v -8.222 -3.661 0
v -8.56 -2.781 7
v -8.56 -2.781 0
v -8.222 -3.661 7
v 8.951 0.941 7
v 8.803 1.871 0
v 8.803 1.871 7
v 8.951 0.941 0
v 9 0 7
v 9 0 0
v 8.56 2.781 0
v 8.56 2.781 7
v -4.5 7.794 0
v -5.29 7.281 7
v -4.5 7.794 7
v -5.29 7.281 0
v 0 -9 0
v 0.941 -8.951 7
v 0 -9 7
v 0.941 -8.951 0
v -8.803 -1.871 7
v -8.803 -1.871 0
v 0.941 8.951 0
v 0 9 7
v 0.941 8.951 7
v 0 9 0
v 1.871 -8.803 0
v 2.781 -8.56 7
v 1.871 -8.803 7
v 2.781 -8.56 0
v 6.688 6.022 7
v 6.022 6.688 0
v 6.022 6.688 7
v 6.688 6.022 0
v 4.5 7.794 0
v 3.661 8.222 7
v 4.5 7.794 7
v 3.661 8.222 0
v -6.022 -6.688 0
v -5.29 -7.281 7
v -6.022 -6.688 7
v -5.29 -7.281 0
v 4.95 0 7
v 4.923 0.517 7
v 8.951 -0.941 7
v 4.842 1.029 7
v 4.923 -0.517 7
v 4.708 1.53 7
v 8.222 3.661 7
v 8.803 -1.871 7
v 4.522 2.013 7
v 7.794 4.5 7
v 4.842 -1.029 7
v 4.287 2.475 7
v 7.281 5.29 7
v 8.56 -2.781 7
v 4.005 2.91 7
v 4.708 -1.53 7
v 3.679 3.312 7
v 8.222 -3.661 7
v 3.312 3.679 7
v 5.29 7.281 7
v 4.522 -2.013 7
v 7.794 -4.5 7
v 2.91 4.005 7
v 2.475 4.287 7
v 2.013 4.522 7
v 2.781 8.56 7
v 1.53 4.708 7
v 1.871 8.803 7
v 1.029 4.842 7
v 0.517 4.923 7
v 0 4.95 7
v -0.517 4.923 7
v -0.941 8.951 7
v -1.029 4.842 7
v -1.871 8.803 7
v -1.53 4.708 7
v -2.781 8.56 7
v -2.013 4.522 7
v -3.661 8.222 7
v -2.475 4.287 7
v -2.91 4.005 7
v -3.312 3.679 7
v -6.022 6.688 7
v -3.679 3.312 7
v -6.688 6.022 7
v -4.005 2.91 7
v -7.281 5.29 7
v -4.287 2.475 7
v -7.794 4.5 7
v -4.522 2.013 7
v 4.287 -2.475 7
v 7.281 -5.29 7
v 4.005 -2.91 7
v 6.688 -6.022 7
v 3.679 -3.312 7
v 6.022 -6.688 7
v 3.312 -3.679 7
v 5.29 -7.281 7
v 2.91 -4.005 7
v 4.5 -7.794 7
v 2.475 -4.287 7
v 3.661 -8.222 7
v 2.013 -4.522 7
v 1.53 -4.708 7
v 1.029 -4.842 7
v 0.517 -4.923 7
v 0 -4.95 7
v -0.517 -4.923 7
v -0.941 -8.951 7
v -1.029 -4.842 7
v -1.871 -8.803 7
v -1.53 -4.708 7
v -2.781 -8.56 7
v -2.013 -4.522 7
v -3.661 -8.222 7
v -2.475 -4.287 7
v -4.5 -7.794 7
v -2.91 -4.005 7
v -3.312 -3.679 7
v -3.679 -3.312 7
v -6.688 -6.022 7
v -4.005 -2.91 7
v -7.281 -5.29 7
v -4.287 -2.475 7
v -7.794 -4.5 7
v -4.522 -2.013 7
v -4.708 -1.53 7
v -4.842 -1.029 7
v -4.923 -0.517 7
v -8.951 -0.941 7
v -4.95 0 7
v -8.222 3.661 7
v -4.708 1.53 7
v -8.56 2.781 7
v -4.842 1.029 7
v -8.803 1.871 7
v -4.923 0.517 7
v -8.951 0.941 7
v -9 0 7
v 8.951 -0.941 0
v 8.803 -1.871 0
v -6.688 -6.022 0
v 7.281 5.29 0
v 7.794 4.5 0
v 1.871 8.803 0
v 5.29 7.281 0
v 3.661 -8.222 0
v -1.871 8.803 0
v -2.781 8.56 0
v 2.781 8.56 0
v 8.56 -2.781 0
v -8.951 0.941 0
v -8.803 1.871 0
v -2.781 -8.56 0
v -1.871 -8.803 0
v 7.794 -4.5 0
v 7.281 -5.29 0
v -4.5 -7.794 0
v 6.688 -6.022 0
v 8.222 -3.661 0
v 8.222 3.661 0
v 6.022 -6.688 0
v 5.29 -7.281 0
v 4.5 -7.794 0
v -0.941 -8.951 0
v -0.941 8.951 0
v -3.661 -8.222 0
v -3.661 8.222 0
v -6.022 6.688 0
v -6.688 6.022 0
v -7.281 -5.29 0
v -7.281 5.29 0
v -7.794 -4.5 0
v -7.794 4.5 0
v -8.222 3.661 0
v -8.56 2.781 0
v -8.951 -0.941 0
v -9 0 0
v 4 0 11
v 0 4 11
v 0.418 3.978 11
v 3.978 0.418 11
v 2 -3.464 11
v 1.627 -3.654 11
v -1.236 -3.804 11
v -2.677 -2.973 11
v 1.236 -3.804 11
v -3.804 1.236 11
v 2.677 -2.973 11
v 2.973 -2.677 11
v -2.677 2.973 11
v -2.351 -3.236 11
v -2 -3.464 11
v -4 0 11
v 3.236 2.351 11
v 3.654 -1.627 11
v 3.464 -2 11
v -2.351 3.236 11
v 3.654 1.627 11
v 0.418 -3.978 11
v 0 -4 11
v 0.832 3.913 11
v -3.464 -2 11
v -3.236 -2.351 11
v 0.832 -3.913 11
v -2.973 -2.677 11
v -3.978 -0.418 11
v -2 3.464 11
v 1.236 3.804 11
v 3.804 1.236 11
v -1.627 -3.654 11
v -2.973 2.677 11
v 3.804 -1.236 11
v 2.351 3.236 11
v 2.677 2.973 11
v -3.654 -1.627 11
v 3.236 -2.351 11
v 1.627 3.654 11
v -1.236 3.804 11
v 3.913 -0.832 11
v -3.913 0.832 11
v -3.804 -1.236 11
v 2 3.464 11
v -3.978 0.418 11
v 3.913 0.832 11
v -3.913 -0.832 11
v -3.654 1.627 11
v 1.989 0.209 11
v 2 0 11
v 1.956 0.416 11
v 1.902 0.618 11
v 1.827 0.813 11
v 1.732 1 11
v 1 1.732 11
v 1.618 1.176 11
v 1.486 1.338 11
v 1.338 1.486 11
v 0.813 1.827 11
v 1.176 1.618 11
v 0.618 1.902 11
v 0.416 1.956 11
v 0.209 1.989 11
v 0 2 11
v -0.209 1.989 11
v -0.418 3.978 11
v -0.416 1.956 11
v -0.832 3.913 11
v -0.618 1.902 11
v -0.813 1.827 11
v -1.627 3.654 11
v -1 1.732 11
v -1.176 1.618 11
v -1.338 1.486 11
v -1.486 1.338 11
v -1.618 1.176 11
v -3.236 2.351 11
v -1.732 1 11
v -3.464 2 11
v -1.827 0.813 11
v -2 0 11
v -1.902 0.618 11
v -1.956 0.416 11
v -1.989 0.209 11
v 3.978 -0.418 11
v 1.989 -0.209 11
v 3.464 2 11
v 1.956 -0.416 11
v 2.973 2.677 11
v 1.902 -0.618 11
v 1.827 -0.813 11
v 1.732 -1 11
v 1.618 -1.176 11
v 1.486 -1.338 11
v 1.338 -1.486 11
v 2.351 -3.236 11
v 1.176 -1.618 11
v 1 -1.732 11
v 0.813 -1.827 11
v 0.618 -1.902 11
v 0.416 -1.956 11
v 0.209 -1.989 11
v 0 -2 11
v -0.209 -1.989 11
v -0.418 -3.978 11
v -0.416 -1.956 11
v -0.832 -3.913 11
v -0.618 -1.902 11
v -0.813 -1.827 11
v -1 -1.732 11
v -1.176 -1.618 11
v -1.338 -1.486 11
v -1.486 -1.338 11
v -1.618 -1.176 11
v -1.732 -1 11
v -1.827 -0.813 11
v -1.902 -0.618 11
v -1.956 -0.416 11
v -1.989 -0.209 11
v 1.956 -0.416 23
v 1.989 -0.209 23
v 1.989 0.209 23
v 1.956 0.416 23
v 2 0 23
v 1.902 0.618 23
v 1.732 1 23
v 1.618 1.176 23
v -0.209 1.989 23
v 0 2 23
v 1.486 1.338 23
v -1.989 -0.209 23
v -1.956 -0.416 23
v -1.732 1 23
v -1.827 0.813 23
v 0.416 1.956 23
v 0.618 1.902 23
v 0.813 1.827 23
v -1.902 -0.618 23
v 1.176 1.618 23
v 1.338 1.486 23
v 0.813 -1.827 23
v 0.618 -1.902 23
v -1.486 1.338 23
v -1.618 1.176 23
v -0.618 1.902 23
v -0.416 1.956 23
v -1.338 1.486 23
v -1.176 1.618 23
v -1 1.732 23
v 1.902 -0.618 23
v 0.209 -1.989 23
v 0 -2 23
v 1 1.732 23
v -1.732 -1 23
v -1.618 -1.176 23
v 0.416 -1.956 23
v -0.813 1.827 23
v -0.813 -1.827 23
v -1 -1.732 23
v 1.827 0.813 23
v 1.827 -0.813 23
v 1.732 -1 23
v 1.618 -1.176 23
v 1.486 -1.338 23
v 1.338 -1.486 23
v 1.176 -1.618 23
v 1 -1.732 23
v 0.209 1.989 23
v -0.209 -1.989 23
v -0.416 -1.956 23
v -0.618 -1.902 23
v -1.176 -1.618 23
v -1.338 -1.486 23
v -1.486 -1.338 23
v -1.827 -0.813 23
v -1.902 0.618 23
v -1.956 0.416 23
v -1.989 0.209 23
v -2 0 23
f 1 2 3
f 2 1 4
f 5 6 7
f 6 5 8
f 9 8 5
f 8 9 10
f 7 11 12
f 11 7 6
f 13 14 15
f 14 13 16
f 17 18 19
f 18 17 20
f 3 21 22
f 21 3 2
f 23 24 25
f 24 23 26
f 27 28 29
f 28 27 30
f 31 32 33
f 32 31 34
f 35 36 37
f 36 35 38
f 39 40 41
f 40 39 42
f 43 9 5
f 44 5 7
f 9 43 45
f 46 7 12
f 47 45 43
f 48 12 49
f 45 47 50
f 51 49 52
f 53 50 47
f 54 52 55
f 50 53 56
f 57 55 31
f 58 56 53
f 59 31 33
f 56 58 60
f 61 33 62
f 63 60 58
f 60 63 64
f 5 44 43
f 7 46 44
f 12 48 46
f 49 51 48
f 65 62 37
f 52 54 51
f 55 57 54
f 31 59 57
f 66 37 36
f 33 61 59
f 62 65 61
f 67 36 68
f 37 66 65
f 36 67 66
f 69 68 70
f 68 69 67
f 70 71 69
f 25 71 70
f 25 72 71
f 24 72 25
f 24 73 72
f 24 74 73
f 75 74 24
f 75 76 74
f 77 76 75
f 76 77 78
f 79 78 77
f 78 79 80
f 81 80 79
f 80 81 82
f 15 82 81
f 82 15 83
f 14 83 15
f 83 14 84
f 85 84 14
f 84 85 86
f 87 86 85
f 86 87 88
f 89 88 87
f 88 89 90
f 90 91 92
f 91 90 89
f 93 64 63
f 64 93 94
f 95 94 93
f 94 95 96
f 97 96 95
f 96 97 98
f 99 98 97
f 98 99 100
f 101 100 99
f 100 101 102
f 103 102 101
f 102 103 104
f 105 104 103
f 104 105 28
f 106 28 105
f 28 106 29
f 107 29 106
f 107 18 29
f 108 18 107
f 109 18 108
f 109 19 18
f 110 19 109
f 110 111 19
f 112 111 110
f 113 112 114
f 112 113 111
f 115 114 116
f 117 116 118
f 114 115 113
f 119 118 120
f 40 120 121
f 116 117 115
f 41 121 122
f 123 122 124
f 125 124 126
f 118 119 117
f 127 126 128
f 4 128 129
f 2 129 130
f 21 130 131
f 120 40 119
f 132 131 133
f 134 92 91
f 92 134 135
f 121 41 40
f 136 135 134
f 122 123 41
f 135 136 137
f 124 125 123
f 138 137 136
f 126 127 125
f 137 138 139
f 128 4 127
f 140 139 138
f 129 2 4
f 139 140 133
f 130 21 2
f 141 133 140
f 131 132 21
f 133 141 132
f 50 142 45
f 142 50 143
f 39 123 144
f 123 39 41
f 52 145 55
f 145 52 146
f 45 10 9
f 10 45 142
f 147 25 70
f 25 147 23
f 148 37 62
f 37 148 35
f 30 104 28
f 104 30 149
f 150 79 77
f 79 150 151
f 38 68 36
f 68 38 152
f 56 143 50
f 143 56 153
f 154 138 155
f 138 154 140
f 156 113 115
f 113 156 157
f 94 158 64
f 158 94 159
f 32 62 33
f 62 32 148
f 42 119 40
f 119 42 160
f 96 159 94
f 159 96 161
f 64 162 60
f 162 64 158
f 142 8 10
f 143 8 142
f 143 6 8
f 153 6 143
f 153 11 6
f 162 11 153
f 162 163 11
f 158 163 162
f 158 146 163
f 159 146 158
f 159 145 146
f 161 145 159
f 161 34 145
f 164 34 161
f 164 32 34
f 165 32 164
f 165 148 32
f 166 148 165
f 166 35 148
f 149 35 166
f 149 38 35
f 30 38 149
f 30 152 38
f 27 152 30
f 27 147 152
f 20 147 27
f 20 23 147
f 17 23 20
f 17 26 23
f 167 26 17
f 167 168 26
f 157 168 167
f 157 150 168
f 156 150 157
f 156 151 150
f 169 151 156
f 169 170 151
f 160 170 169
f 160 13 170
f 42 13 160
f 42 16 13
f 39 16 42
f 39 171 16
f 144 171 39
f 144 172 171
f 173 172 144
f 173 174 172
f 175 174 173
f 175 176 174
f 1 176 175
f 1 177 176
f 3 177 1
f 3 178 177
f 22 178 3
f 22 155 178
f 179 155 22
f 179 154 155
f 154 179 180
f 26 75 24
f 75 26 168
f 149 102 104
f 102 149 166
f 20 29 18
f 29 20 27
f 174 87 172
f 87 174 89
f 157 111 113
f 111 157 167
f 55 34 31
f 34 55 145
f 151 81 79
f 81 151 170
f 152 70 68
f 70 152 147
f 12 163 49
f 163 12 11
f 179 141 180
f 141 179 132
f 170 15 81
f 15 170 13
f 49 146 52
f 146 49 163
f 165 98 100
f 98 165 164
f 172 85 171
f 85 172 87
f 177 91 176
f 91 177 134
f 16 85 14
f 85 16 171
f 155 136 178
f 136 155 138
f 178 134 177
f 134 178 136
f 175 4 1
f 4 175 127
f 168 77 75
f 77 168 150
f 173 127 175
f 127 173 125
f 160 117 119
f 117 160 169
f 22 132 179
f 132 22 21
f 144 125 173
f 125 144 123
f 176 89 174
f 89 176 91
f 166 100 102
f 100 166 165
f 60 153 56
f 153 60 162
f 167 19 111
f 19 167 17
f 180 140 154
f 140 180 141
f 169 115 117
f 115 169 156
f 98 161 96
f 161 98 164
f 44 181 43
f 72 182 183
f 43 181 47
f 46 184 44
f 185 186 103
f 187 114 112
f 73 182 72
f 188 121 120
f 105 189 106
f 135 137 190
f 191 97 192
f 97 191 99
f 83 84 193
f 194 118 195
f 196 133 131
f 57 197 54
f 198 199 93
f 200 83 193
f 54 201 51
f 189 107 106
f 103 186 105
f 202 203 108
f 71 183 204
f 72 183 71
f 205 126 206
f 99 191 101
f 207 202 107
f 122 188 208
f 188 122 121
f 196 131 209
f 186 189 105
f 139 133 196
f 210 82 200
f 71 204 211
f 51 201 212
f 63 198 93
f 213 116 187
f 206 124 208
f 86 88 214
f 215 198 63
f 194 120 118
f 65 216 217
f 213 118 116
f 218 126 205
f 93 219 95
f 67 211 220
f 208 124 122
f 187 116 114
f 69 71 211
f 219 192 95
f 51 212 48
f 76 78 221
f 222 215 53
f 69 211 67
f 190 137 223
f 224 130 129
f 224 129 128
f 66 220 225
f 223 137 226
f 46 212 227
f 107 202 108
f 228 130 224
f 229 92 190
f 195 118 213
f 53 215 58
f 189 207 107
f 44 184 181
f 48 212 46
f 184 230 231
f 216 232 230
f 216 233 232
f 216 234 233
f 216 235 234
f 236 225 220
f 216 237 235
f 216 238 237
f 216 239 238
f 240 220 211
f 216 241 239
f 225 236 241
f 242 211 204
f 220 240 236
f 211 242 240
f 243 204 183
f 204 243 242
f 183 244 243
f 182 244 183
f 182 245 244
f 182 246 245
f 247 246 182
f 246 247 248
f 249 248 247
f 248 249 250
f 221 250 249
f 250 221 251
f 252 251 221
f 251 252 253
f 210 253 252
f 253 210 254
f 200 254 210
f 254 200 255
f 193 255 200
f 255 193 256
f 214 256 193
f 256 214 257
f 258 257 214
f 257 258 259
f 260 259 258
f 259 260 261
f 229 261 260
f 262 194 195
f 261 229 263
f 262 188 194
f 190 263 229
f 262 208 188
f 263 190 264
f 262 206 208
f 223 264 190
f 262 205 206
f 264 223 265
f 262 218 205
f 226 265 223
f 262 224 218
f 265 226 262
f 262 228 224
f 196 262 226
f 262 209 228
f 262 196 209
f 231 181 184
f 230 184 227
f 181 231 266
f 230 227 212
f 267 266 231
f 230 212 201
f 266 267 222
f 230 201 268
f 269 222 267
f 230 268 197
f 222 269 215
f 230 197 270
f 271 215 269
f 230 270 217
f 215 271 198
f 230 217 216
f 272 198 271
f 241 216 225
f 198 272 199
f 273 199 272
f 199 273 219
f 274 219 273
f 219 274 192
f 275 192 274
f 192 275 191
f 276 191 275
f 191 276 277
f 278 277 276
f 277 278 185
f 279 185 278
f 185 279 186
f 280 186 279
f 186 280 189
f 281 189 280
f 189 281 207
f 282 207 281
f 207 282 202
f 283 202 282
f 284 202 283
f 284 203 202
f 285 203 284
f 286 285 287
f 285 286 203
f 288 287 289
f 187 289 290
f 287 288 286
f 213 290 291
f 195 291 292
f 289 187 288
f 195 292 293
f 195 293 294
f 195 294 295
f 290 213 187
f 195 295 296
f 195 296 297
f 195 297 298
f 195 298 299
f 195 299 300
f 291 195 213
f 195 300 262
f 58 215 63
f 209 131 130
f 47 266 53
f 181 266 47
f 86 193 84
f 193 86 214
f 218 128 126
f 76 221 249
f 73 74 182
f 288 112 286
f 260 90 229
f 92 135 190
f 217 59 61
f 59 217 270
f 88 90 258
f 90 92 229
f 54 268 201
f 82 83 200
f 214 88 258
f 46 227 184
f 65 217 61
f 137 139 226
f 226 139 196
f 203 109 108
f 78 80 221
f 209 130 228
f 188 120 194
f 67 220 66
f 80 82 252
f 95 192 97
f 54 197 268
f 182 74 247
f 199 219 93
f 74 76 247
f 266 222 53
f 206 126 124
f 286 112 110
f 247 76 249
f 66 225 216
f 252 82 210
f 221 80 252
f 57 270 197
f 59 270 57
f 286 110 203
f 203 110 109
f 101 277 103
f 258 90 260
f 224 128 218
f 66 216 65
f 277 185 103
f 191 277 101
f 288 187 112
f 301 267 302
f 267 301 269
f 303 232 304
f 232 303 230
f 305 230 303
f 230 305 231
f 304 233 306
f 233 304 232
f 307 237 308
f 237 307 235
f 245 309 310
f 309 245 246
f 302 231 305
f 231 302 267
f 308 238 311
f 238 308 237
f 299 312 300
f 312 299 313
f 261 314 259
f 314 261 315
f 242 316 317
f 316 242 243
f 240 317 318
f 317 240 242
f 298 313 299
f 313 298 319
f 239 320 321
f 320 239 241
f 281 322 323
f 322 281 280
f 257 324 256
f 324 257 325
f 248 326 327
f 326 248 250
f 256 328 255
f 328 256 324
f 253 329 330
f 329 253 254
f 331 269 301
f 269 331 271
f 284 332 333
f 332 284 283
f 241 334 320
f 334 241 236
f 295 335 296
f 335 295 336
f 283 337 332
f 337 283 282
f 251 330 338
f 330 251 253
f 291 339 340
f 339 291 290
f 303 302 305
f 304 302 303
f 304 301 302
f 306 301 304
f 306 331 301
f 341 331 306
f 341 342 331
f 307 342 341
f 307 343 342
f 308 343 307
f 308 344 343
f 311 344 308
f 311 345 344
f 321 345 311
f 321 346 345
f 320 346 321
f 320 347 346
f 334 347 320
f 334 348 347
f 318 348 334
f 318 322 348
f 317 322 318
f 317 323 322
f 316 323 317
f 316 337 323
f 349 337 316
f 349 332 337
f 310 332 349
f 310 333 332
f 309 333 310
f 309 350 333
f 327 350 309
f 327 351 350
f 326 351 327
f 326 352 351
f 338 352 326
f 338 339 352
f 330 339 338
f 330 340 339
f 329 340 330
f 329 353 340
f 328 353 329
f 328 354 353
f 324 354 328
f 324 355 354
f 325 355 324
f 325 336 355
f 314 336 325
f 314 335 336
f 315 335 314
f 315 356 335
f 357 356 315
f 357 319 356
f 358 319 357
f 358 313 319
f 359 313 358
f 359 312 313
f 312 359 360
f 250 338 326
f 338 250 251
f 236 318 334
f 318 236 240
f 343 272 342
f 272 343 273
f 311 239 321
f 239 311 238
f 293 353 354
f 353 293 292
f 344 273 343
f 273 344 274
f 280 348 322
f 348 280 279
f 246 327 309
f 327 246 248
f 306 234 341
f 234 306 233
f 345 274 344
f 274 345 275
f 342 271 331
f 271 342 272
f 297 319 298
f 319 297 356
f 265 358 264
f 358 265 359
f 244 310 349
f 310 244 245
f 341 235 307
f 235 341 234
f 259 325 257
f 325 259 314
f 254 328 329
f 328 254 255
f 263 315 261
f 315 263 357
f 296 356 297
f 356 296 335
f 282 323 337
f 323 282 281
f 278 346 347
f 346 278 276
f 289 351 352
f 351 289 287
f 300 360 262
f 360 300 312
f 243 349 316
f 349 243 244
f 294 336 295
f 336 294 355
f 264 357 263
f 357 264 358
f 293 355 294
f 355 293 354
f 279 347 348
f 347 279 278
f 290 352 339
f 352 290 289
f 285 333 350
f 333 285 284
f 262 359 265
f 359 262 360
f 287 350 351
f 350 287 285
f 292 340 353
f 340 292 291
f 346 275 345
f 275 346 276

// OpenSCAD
// Adjustable leveling foot, smooth threaded-shaft representation.
$fn = 60;
eps = 0.02;
shaft_d = 4;
pad_d = 18;
shaft_l = 12;
pad_h = 7;
union() {
    cylinder(d = pad_d, h = pad_h);
    translate([0, 0, pad_h]) cylinder(d1 = pad_d * 0.55, d2 = shaft_d + 4, h = 4);
    translate([0, 0, pad_h + 4]) cylinder(d = shaft_d, h = shaft_l);
}
